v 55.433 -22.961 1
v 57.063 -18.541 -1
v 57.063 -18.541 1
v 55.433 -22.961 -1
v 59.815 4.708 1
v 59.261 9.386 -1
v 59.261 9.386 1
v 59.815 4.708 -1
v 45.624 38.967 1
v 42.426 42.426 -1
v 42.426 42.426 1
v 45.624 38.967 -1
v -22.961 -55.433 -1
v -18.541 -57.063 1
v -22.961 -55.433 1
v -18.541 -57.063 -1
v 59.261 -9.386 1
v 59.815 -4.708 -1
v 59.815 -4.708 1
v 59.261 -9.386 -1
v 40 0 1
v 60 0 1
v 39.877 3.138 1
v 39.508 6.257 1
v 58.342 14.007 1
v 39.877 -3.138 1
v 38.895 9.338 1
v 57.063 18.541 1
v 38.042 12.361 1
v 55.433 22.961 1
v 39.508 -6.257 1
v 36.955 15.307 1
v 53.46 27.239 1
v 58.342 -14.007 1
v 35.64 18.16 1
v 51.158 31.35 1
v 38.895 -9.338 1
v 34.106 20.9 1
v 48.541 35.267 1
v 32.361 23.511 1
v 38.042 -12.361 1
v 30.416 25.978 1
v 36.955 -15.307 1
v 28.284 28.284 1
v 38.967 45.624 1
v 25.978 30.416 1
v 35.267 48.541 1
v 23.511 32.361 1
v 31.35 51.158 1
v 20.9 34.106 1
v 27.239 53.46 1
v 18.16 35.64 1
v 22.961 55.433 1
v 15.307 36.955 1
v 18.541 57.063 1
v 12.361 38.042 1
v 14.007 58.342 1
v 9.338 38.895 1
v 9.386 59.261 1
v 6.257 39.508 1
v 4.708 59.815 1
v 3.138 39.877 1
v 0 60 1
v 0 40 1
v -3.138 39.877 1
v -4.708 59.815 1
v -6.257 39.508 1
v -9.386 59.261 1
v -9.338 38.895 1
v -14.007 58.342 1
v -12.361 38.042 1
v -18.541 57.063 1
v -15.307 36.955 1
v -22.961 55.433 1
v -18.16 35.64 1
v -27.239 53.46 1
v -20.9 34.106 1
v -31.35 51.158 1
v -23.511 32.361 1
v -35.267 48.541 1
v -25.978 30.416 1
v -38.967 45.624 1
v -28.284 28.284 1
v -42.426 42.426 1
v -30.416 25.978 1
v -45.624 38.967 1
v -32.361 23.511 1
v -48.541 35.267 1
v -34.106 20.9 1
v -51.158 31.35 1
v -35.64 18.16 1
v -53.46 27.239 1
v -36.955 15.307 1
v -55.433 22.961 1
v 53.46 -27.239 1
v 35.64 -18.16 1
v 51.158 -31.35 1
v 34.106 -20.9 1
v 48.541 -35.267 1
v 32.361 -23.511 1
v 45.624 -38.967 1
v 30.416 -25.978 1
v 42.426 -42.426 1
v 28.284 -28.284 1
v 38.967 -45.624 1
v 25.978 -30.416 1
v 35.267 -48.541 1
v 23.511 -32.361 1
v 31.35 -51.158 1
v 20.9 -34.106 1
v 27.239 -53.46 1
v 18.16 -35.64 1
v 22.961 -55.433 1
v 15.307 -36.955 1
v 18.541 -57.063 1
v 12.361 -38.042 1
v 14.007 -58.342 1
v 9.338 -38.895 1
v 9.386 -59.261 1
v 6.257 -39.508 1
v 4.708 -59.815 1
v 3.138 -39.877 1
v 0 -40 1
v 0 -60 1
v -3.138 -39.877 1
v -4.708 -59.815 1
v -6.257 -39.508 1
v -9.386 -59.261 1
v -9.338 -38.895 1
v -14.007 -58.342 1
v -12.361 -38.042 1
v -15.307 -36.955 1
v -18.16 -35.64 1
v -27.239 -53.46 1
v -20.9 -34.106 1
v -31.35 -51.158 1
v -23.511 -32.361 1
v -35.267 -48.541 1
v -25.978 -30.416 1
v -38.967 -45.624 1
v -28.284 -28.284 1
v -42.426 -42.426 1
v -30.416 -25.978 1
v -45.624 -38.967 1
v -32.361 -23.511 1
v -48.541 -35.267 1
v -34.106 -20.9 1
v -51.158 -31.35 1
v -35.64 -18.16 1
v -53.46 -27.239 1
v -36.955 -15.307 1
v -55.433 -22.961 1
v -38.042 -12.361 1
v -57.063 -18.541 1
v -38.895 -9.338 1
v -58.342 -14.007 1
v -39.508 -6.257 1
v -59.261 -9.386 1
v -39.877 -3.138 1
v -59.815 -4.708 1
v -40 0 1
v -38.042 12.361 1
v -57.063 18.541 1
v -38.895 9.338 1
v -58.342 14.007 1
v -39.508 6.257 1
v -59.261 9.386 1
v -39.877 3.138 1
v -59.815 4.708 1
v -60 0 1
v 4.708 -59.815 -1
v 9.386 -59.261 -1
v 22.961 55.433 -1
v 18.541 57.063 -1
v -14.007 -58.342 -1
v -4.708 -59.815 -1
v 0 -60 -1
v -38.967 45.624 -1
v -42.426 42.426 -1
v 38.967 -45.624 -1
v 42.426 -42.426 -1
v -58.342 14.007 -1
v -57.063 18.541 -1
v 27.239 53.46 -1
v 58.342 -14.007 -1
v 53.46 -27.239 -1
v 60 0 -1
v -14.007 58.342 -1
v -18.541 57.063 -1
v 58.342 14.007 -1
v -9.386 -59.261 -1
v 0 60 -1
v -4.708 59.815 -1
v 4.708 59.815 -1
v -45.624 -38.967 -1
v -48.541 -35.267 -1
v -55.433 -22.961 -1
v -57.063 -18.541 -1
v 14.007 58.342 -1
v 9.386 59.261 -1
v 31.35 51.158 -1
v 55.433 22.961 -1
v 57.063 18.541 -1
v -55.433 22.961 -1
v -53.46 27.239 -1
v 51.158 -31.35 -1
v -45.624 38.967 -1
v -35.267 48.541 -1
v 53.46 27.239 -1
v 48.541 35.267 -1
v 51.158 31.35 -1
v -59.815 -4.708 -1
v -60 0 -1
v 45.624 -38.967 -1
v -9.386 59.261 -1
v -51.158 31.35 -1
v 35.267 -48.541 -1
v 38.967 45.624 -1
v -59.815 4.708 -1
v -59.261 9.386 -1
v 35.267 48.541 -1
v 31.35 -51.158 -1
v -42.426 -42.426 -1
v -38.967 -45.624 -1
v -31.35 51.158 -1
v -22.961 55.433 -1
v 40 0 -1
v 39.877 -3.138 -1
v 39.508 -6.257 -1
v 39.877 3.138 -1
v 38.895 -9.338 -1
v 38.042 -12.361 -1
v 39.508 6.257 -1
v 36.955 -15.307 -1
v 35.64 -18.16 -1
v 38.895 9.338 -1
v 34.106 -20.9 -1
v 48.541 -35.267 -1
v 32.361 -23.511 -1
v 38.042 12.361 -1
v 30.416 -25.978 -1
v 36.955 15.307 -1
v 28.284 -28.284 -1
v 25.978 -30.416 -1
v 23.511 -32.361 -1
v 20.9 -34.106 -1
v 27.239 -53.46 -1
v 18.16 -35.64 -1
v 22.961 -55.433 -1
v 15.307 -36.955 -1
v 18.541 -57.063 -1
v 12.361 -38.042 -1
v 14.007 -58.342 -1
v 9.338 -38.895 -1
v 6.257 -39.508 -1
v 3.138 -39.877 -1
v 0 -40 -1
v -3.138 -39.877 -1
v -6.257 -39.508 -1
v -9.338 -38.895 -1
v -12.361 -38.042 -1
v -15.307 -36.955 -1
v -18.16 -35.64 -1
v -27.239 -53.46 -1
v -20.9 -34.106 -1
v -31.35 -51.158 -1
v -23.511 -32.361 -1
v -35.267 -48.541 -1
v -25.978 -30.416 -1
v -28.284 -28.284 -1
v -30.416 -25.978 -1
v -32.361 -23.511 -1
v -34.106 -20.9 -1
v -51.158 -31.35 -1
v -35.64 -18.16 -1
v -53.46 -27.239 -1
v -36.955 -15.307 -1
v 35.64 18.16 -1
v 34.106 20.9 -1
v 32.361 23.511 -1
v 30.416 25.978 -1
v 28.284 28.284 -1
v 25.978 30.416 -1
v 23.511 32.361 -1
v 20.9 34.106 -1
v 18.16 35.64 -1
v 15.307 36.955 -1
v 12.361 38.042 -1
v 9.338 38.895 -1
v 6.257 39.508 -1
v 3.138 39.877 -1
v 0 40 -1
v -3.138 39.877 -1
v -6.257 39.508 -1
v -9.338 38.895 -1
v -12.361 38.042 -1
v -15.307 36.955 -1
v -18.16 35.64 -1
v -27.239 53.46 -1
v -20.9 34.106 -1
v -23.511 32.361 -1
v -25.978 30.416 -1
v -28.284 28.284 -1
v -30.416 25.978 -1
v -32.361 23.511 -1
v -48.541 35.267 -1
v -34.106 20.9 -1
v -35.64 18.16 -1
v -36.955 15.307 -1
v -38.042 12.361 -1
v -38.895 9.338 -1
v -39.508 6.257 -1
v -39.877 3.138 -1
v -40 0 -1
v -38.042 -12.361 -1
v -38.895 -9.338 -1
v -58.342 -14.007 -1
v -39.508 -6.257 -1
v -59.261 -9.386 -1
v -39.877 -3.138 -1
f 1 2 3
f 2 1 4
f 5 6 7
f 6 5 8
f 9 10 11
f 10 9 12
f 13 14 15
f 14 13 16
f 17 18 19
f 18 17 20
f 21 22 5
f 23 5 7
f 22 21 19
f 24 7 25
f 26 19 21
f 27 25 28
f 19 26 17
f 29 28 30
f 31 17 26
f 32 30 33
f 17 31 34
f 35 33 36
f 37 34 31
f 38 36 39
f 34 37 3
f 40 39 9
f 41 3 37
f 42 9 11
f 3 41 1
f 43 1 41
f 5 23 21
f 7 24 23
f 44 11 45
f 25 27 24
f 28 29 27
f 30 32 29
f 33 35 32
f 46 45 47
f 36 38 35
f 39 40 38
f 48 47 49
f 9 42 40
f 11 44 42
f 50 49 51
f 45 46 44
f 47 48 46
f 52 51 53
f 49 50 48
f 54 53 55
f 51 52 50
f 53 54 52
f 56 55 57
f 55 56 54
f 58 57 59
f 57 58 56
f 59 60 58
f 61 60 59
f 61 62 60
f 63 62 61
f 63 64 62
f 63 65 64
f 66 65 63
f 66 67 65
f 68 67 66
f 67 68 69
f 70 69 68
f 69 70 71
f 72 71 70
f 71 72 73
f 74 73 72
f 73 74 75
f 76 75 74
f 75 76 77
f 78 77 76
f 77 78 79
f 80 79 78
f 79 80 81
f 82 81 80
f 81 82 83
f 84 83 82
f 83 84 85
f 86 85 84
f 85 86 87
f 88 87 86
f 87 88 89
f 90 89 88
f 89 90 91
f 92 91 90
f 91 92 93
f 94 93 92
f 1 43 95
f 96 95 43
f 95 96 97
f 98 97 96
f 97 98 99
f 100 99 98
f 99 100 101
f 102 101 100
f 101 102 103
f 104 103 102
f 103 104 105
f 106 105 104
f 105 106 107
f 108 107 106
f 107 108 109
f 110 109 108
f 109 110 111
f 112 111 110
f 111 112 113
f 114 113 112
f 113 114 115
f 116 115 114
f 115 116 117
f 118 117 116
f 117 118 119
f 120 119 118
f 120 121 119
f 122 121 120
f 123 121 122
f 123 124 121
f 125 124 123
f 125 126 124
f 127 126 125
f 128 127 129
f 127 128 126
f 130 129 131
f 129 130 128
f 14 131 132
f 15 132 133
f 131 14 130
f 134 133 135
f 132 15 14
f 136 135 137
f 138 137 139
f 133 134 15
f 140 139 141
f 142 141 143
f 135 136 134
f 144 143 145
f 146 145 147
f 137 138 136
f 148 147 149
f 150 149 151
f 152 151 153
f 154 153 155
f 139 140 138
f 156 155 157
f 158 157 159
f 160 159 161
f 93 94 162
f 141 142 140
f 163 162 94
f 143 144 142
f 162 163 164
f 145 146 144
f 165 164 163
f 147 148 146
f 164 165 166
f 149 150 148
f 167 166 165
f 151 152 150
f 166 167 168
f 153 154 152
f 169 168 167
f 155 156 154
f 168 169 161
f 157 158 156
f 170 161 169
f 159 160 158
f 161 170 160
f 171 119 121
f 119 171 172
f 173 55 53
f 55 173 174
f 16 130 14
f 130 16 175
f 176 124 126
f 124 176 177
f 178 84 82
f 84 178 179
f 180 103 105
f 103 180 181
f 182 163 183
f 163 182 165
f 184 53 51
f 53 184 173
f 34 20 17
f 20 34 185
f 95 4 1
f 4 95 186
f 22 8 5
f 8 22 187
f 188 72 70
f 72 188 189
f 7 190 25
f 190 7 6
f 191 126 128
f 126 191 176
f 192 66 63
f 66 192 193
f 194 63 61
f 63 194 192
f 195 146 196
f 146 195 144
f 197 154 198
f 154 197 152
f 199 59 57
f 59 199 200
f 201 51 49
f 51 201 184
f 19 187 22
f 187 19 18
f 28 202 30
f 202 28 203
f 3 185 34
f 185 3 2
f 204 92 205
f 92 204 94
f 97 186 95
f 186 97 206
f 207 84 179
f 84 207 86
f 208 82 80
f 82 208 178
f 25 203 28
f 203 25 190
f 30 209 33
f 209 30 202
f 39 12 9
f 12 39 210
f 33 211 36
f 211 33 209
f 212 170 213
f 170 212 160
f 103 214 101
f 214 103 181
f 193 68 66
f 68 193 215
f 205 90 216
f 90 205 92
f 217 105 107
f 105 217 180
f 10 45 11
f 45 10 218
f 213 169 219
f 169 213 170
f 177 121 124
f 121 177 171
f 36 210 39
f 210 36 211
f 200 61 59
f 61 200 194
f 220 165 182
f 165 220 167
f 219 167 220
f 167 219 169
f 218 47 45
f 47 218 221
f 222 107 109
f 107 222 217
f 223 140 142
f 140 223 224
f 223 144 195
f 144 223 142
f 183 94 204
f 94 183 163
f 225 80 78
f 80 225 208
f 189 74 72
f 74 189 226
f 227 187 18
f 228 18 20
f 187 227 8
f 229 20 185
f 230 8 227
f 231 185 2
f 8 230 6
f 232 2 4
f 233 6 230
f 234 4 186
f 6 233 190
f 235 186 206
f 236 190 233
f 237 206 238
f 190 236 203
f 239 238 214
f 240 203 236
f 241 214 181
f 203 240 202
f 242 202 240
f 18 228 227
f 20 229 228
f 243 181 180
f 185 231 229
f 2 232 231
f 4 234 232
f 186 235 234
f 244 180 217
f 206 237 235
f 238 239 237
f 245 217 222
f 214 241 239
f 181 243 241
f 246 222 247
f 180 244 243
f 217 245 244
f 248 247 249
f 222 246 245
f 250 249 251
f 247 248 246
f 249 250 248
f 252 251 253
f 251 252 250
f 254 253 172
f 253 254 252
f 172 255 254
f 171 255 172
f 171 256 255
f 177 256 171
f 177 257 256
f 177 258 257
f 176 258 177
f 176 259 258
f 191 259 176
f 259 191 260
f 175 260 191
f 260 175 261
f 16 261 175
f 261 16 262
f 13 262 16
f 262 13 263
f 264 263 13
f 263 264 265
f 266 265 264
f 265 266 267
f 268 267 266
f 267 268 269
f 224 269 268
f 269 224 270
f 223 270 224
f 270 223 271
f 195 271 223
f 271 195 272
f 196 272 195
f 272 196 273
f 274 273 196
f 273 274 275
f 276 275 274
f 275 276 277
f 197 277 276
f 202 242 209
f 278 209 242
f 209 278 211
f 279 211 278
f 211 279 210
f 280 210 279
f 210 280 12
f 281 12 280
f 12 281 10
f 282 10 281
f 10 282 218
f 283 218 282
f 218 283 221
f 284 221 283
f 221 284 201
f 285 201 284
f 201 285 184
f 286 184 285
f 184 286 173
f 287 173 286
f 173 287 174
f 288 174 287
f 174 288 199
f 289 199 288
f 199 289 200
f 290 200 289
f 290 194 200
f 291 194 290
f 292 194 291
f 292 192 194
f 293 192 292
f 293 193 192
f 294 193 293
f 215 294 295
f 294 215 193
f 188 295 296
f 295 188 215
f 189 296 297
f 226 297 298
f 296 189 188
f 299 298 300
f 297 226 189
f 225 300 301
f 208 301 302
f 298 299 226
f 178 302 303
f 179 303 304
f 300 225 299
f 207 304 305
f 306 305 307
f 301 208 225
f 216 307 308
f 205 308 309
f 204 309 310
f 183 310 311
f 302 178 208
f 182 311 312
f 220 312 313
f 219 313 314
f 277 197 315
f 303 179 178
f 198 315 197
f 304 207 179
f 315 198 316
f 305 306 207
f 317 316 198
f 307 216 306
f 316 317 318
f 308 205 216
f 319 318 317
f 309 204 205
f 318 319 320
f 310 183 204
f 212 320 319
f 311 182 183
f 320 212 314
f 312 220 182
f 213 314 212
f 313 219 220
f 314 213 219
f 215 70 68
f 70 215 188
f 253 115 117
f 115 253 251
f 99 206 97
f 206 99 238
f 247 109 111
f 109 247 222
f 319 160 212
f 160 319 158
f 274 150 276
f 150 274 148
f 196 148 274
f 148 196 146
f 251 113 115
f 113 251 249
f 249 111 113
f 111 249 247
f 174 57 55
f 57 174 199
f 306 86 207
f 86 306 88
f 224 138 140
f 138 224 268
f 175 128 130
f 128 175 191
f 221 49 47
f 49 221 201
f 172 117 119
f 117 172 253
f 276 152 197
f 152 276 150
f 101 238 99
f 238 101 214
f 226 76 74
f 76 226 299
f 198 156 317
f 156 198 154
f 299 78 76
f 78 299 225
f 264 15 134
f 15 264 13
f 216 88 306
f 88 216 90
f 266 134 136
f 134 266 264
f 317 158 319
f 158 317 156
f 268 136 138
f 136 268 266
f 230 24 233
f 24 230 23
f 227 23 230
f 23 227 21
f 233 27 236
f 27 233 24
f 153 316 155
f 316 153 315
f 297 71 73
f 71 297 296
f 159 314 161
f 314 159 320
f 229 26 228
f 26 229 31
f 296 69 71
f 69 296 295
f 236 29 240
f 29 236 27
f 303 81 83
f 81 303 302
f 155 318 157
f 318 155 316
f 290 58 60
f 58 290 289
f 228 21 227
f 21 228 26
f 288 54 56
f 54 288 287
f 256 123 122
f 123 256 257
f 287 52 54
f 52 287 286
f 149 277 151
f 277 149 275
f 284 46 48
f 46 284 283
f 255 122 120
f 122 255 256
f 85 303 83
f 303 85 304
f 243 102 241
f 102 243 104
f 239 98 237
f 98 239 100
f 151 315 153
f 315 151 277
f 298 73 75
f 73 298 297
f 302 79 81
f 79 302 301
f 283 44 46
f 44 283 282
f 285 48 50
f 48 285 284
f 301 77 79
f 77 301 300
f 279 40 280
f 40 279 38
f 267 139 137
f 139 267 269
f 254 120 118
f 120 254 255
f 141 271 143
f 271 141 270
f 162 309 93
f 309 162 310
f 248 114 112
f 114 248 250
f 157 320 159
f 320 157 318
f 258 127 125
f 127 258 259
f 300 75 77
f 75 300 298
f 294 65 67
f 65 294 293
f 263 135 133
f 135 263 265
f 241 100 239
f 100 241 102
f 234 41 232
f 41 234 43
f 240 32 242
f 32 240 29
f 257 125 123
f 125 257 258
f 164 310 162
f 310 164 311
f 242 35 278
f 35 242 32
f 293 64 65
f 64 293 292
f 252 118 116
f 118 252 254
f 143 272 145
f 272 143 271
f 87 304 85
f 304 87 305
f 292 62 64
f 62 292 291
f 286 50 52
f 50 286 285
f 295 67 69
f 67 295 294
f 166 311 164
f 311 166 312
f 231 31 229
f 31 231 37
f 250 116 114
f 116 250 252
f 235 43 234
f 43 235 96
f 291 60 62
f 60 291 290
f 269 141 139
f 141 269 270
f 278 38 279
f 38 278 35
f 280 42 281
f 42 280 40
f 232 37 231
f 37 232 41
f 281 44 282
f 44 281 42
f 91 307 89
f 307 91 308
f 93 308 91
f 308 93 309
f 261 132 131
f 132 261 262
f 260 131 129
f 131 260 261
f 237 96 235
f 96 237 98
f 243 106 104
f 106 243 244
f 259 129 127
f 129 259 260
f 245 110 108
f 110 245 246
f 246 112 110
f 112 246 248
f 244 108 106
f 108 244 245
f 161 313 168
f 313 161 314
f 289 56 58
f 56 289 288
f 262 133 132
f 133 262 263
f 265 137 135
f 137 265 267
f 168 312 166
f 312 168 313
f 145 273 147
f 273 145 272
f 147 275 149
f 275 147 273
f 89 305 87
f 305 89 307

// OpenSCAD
 
 di=80;  //inner diameter
 da=120; // Outer diameter
 h=2;   // Height
 
 $fn= 80;
 difference() {
 cylinder(h=h, d1=da, d2=da, center=true);
 cylinder(h=h+1, d1=di, d2=di ,center=true);
     }
